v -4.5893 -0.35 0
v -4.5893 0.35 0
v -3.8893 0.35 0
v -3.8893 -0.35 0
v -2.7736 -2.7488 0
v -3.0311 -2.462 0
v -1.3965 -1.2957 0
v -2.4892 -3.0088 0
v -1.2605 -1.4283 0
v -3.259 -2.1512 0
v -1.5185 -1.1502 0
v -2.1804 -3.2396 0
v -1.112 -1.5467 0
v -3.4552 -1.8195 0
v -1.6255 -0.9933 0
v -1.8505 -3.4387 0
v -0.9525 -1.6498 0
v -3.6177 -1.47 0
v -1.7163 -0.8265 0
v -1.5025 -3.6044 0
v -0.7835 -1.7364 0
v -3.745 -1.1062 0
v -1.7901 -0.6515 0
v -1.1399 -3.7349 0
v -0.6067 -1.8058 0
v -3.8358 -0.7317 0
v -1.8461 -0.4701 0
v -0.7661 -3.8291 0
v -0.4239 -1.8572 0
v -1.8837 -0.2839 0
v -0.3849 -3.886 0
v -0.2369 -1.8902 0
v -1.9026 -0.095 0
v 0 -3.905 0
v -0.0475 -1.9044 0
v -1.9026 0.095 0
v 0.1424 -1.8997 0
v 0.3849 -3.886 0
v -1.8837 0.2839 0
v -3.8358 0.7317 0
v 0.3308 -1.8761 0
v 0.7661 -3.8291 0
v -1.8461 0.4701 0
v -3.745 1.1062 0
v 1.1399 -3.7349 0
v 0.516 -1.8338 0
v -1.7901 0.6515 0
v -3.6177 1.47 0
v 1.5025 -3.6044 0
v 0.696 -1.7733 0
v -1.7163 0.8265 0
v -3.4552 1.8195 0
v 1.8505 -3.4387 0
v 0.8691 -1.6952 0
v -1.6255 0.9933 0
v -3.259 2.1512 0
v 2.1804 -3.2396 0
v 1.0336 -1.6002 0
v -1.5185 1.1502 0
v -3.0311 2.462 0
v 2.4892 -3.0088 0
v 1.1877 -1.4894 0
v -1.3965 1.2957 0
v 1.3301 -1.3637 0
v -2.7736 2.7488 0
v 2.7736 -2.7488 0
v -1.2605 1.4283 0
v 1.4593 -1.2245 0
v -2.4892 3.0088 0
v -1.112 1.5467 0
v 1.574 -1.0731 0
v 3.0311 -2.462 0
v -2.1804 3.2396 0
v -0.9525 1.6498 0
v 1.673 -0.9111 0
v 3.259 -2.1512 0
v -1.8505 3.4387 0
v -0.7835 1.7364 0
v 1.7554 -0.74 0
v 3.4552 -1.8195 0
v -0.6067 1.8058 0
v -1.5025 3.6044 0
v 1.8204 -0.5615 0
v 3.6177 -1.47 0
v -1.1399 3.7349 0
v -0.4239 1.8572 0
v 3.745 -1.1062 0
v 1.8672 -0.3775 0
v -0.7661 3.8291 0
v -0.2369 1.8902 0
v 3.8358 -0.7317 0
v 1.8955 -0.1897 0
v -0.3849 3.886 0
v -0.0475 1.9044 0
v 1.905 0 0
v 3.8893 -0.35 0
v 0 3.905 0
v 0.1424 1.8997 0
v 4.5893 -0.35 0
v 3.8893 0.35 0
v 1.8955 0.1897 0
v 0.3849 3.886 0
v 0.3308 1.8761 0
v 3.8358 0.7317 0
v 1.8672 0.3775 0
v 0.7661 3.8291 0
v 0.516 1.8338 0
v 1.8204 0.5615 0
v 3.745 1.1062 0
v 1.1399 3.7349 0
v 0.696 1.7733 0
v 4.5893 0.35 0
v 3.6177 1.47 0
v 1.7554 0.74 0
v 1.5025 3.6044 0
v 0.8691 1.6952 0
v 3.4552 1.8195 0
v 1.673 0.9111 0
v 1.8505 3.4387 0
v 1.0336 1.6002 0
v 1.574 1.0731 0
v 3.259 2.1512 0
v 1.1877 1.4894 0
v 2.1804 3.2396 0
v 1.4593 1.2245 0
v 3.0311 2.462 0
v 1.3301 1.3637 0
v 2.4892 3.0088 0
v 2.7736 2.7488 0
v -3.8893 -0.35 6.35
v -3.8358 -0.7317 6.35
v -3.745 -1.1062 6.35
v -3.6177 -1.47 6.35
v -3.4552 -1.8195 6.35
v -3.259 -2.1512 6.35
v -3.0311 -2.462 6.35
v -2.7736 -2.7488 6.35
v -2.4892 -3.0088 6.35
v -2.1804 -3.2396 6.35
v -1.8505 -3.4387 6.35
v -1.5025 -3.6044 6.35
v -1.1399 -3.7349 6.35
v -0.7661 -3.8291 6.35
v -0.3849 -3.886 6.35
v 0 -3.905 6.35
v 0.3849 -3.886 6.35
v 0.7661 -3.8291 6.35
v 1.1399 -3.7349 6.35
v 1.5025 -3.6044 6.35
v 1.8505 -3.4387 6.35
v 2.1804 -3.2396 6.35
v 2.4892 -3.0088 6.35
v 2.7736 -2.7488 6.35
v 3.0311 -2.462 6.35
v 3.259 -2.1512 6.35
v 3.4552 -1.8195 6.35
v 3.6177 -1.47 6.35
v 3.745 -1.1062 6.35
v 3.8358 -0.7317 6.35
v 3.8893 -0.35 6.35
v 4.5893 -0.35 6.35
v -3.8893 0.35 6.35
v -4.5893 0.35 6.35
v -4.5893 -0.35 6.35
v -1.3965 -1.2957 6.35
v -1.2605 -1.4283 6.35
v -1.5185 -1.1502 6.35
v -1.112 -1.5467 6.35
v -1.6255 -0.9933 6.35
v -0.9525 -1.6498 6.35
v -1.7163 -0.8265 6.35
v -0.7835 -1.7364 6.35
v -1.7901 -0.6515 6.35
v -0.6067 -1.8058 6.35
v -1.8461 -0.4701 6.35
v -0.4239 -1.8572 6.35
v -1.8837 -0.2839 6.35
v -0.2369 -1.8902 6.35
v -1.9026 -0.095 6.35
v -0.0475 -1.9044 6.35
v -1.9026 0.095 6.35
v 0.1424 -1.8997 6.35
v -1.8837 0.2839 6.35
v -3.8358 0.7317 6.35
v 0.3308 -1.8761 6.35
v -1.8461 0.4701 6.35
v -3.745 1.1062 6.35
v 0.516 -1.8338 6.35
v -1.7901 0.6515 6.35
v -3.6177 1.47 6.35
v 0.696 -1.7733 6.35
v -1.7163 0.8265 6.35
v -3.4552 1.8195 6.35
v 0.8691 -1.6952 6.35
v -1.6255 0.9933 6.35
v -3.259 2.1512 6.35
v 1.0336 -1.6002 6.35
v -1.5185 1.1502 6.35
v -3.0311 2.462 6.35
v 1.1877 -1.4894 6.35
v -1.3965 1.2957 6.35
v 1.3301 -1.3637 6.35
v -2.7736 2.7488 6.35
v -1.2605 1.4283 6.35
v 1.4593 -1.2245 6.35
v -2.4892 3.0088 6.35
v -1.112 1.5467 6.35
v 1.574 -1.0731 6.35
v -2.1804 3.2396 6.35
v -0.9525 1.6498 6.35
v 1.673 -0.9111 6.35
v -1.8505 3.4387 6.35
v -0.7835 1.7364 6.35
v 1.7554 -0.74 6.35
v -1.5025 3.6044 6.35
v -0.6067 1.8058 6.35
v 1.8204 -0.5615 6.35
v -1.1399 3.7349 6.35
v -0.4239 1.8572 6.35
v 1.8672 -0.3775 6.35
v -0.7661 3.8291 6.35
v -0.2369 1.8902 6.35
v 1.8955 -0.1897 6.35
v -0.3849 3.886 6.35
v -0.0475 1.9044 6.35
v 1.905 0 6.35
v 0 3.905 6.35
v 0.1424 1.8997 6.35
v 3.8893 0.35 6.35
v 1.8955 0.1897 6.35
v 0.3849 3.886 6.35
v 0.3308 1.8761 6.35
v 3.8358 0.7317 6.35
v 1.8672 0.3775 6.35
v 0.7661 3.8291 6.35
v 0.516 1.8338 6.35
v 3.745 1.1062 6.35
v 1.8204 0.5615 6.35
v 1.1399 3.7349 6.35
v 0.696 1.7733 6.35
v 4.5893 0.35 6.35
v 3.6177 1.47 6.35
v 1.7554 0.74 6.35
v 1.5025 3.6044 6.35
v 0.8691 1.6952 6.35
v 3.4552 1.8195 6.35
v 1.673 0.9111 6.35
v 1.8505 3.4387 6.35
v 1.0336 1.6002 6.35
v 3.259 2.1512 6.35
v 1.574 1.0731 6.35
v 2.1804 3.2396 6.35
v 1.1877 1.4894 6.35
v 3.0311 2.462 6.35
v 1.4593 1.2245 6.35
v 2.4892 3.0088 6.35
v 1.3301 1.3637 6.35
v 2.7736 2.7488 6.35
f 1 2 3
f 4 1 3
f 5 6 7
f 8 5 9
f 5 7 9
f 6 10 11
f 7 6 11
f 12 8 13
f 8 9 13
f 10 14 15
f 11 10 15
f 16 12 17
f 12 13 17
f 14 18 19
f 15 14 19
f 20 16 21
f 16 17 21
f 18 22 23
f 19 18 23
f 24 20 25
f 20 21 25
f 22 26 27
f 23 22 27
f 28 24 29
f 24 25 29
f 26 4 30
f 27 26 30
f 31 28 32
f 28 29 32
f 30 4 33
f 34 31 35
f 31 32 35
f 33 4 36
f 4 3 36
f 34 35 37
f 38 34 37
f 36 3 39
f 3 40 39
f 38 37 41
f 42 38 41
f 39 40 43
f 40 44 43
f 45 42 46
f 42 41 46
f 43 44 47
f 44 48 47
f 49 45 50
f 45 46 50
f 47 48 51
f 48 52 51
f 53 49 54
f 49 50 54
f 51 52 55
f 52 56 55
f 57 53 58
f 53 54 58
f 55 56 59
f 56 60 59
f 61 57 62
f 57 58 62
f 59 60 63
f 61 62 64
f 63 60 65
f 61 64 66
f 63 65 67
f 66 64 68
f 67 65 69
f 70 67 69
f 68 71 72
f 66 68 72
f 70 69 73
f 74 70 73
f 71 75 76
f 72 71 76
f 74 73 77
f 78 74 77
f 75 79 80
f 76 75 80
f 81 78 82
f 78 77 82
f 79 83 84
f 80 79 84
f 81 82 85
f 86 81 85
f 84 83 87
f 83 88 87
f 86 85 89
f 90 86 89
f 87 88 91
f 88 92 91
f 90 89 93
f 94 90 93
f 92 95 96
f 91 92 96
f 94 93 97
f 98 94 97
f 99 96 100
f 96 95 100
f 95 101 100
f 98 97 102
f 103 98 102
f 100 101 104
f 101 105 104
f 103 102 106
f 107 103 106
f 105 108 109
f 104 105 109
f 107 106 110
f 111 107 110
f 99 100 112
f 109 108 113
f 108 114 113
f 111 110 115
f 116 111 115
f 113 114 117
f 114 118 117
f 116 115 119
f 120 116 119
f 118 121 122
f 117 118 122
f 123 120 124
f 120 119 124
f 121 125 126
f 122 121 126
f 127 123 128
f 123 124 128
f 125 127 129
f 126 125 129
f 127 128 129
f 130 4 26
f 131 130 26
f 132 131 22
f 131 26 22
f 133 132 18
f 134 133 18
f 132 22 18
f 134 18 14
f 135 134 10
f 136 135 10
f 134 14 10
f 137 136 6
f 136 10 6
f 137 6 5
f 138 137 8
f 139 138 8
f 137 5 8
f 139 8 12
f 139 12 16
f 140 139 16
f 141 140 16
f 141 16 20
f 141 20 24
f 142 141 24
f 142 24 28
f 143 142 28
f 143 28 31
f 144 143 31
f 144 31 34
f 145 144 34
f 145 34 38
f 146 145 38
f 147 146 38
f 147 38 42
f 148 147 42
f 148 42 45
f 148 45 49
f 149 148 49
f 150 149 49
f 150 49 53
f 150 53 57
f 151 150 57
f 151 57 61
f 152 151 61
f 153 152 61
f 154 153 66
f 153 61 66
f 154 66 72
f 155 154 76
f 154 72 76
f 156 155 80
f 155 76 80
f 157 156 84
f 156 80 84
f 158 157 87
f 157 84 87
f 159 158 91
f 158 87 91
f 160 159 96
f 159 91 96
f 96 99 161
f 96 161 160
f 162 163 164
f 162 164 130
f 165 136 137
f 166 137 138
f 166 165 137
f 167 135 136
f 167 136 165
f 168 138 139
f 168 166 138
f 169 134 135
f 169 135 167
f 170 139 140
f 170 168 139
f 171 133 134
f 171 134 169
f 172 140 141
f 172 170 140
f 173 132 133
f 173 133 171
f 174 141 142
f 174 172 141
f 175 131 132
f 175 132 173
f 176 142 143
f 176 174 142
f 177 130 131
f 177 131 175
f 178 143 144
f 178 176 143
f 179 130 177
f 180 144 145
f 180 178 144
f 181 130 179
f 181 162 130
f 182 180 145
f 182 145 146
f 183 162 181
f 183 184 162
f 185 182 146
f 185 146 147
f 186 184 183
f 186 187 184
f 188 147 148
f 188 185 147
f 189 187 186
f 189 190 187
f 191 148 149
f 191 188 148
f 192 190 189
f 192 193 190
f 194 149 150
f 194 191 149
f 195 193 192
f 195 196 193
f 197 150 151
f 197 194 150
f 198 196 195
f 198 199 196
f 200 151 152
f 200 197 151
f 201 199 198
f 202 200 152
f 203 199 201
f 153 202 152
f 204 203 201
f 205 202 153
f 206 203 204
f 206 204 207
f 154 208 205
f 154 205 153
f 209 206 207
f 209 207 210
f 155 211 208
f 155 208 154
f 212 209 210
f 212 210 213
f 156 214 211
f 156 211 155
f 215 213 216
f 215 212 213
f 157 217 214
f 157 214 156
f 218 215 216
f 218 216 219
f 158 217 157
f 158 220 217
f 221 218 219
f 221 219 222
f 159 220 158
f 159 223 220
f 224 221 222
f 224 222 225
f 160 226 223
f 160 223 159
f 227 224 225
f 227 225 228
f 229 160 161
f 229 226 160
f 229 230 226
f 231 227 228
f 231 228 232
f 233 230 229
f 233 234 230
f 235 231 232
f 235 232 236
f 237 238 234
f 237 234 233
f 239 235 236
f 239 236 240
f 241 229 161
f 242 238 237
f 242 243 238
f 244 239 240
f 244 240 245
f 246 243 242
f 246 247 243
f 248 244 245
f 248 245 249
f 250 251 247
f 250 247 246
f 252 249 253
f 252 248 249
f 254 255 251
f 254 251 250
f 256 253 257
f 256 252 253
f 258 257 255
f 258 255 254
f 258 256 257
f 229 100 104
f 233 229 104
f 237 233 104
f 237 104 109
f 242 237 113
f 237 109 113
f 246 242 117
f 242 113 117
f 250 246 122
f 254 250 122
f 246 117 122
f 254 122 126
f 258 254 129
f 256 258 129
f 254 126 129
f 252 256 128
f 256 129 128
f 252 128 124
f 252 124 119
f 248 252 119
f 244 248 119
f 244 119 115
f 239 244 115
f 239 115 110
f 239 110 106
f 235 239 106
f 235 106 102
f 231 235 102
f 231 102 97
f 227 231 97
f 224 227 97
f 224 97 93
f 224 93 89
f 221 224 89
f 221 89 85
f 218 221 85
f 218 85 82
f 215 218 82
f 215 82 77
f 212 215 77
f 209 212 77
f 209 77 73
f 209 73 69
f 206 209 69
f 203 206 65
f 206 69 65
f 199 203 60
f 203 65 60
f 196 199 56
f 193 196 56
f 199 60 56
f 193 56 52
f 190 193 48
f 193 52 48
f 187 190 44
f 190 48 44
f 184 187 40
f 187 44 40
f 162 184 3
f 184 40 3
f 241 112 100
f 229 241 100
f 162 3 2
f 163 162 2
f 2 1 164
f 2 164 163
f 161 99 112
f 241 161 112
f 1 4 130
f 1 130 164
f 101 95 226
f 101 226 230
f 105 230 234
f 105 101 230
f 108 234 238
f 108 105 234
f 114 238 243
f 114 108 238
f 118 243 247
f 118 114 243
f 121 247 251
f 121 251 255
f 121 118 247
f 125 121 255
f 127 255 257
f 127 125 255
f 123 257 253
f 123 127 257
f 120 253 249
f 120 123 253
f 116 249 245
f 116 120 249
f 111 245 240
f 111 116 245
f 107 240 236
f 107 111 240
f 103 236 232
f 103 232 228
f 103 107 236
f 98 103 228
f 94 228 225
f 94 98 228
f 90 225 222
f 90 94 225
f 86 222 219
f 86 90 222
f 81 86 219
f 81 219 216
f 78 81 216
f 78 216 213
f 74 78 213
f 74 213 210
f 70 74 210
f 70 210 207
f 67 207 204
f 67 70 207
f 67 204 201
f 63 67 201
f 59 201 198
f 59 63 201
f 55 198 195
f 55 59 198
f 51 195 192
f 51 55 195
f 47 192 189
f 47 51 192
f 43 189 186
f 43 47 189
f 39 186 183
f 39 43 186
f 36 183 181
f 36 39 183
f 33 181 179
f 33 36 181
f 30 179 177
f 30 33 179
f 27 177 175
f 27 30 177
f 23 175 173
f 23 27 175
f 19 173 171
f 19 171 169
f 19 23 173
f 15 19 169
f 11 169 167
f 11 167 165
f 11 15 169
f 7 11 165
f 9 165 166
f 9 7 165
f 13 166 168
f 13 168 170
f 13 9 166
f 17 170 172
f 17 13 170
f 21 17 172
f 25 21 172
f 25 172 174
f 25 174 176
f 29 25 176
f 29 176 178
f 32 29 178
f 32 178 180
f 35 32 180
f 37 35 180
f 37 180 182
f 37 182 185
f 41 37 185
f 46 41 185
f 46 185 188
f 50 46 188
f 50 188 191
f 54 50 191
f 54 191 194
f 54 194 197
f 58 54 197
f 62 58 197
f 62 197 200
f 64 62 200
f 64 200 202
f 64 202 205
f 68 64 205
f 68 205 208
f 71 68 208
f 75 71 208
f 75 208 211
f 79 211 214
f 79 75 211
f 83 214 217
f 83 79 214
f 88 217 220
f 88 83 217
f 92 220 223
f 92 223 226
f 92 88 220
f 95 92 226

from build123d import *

# Parameters (mm, degrees)
SKETCH1_R           = 3.905
SKETCH1_R_2         = 1.905
BOSS_EXTRUDE1_DEPTH = 6.35
SKETCH2_W           = 0.7
SKETCH2_H           = 0.7
BOSS_EXTRUDE2_DEPTH = 6.35


with BuildPart() as part:
    # Sketch1 → Boss-Extrude1 (new body)
    with BuildSketch(Plane.XY):
        Circle(SKETCH1_R)
        Circle(SKETCH1_R_2, mode=Mode.SUBTRACT)
    extrude(amount=BOSS_EXTRUDE1_DEPTH)

    # Sketch2 → Boss-Extrude2 (add)
    with BuildSketch(Plane(origin=(0, 0, 0), x_dir=(-1, 0, 0), z_dir=(0, 0, -1))):
        with Locations((4.239283353, 0)):
            Rectangle(SKETCH2_W, SKETCH2_H)
        with Locations((-4.239283353, 0)):
            Rectangle(SKETCH2_W, SKETCH2_H)
    extrude(amount=-BOSS_EXTRUDE2_DEPTH)


solid = part.part
